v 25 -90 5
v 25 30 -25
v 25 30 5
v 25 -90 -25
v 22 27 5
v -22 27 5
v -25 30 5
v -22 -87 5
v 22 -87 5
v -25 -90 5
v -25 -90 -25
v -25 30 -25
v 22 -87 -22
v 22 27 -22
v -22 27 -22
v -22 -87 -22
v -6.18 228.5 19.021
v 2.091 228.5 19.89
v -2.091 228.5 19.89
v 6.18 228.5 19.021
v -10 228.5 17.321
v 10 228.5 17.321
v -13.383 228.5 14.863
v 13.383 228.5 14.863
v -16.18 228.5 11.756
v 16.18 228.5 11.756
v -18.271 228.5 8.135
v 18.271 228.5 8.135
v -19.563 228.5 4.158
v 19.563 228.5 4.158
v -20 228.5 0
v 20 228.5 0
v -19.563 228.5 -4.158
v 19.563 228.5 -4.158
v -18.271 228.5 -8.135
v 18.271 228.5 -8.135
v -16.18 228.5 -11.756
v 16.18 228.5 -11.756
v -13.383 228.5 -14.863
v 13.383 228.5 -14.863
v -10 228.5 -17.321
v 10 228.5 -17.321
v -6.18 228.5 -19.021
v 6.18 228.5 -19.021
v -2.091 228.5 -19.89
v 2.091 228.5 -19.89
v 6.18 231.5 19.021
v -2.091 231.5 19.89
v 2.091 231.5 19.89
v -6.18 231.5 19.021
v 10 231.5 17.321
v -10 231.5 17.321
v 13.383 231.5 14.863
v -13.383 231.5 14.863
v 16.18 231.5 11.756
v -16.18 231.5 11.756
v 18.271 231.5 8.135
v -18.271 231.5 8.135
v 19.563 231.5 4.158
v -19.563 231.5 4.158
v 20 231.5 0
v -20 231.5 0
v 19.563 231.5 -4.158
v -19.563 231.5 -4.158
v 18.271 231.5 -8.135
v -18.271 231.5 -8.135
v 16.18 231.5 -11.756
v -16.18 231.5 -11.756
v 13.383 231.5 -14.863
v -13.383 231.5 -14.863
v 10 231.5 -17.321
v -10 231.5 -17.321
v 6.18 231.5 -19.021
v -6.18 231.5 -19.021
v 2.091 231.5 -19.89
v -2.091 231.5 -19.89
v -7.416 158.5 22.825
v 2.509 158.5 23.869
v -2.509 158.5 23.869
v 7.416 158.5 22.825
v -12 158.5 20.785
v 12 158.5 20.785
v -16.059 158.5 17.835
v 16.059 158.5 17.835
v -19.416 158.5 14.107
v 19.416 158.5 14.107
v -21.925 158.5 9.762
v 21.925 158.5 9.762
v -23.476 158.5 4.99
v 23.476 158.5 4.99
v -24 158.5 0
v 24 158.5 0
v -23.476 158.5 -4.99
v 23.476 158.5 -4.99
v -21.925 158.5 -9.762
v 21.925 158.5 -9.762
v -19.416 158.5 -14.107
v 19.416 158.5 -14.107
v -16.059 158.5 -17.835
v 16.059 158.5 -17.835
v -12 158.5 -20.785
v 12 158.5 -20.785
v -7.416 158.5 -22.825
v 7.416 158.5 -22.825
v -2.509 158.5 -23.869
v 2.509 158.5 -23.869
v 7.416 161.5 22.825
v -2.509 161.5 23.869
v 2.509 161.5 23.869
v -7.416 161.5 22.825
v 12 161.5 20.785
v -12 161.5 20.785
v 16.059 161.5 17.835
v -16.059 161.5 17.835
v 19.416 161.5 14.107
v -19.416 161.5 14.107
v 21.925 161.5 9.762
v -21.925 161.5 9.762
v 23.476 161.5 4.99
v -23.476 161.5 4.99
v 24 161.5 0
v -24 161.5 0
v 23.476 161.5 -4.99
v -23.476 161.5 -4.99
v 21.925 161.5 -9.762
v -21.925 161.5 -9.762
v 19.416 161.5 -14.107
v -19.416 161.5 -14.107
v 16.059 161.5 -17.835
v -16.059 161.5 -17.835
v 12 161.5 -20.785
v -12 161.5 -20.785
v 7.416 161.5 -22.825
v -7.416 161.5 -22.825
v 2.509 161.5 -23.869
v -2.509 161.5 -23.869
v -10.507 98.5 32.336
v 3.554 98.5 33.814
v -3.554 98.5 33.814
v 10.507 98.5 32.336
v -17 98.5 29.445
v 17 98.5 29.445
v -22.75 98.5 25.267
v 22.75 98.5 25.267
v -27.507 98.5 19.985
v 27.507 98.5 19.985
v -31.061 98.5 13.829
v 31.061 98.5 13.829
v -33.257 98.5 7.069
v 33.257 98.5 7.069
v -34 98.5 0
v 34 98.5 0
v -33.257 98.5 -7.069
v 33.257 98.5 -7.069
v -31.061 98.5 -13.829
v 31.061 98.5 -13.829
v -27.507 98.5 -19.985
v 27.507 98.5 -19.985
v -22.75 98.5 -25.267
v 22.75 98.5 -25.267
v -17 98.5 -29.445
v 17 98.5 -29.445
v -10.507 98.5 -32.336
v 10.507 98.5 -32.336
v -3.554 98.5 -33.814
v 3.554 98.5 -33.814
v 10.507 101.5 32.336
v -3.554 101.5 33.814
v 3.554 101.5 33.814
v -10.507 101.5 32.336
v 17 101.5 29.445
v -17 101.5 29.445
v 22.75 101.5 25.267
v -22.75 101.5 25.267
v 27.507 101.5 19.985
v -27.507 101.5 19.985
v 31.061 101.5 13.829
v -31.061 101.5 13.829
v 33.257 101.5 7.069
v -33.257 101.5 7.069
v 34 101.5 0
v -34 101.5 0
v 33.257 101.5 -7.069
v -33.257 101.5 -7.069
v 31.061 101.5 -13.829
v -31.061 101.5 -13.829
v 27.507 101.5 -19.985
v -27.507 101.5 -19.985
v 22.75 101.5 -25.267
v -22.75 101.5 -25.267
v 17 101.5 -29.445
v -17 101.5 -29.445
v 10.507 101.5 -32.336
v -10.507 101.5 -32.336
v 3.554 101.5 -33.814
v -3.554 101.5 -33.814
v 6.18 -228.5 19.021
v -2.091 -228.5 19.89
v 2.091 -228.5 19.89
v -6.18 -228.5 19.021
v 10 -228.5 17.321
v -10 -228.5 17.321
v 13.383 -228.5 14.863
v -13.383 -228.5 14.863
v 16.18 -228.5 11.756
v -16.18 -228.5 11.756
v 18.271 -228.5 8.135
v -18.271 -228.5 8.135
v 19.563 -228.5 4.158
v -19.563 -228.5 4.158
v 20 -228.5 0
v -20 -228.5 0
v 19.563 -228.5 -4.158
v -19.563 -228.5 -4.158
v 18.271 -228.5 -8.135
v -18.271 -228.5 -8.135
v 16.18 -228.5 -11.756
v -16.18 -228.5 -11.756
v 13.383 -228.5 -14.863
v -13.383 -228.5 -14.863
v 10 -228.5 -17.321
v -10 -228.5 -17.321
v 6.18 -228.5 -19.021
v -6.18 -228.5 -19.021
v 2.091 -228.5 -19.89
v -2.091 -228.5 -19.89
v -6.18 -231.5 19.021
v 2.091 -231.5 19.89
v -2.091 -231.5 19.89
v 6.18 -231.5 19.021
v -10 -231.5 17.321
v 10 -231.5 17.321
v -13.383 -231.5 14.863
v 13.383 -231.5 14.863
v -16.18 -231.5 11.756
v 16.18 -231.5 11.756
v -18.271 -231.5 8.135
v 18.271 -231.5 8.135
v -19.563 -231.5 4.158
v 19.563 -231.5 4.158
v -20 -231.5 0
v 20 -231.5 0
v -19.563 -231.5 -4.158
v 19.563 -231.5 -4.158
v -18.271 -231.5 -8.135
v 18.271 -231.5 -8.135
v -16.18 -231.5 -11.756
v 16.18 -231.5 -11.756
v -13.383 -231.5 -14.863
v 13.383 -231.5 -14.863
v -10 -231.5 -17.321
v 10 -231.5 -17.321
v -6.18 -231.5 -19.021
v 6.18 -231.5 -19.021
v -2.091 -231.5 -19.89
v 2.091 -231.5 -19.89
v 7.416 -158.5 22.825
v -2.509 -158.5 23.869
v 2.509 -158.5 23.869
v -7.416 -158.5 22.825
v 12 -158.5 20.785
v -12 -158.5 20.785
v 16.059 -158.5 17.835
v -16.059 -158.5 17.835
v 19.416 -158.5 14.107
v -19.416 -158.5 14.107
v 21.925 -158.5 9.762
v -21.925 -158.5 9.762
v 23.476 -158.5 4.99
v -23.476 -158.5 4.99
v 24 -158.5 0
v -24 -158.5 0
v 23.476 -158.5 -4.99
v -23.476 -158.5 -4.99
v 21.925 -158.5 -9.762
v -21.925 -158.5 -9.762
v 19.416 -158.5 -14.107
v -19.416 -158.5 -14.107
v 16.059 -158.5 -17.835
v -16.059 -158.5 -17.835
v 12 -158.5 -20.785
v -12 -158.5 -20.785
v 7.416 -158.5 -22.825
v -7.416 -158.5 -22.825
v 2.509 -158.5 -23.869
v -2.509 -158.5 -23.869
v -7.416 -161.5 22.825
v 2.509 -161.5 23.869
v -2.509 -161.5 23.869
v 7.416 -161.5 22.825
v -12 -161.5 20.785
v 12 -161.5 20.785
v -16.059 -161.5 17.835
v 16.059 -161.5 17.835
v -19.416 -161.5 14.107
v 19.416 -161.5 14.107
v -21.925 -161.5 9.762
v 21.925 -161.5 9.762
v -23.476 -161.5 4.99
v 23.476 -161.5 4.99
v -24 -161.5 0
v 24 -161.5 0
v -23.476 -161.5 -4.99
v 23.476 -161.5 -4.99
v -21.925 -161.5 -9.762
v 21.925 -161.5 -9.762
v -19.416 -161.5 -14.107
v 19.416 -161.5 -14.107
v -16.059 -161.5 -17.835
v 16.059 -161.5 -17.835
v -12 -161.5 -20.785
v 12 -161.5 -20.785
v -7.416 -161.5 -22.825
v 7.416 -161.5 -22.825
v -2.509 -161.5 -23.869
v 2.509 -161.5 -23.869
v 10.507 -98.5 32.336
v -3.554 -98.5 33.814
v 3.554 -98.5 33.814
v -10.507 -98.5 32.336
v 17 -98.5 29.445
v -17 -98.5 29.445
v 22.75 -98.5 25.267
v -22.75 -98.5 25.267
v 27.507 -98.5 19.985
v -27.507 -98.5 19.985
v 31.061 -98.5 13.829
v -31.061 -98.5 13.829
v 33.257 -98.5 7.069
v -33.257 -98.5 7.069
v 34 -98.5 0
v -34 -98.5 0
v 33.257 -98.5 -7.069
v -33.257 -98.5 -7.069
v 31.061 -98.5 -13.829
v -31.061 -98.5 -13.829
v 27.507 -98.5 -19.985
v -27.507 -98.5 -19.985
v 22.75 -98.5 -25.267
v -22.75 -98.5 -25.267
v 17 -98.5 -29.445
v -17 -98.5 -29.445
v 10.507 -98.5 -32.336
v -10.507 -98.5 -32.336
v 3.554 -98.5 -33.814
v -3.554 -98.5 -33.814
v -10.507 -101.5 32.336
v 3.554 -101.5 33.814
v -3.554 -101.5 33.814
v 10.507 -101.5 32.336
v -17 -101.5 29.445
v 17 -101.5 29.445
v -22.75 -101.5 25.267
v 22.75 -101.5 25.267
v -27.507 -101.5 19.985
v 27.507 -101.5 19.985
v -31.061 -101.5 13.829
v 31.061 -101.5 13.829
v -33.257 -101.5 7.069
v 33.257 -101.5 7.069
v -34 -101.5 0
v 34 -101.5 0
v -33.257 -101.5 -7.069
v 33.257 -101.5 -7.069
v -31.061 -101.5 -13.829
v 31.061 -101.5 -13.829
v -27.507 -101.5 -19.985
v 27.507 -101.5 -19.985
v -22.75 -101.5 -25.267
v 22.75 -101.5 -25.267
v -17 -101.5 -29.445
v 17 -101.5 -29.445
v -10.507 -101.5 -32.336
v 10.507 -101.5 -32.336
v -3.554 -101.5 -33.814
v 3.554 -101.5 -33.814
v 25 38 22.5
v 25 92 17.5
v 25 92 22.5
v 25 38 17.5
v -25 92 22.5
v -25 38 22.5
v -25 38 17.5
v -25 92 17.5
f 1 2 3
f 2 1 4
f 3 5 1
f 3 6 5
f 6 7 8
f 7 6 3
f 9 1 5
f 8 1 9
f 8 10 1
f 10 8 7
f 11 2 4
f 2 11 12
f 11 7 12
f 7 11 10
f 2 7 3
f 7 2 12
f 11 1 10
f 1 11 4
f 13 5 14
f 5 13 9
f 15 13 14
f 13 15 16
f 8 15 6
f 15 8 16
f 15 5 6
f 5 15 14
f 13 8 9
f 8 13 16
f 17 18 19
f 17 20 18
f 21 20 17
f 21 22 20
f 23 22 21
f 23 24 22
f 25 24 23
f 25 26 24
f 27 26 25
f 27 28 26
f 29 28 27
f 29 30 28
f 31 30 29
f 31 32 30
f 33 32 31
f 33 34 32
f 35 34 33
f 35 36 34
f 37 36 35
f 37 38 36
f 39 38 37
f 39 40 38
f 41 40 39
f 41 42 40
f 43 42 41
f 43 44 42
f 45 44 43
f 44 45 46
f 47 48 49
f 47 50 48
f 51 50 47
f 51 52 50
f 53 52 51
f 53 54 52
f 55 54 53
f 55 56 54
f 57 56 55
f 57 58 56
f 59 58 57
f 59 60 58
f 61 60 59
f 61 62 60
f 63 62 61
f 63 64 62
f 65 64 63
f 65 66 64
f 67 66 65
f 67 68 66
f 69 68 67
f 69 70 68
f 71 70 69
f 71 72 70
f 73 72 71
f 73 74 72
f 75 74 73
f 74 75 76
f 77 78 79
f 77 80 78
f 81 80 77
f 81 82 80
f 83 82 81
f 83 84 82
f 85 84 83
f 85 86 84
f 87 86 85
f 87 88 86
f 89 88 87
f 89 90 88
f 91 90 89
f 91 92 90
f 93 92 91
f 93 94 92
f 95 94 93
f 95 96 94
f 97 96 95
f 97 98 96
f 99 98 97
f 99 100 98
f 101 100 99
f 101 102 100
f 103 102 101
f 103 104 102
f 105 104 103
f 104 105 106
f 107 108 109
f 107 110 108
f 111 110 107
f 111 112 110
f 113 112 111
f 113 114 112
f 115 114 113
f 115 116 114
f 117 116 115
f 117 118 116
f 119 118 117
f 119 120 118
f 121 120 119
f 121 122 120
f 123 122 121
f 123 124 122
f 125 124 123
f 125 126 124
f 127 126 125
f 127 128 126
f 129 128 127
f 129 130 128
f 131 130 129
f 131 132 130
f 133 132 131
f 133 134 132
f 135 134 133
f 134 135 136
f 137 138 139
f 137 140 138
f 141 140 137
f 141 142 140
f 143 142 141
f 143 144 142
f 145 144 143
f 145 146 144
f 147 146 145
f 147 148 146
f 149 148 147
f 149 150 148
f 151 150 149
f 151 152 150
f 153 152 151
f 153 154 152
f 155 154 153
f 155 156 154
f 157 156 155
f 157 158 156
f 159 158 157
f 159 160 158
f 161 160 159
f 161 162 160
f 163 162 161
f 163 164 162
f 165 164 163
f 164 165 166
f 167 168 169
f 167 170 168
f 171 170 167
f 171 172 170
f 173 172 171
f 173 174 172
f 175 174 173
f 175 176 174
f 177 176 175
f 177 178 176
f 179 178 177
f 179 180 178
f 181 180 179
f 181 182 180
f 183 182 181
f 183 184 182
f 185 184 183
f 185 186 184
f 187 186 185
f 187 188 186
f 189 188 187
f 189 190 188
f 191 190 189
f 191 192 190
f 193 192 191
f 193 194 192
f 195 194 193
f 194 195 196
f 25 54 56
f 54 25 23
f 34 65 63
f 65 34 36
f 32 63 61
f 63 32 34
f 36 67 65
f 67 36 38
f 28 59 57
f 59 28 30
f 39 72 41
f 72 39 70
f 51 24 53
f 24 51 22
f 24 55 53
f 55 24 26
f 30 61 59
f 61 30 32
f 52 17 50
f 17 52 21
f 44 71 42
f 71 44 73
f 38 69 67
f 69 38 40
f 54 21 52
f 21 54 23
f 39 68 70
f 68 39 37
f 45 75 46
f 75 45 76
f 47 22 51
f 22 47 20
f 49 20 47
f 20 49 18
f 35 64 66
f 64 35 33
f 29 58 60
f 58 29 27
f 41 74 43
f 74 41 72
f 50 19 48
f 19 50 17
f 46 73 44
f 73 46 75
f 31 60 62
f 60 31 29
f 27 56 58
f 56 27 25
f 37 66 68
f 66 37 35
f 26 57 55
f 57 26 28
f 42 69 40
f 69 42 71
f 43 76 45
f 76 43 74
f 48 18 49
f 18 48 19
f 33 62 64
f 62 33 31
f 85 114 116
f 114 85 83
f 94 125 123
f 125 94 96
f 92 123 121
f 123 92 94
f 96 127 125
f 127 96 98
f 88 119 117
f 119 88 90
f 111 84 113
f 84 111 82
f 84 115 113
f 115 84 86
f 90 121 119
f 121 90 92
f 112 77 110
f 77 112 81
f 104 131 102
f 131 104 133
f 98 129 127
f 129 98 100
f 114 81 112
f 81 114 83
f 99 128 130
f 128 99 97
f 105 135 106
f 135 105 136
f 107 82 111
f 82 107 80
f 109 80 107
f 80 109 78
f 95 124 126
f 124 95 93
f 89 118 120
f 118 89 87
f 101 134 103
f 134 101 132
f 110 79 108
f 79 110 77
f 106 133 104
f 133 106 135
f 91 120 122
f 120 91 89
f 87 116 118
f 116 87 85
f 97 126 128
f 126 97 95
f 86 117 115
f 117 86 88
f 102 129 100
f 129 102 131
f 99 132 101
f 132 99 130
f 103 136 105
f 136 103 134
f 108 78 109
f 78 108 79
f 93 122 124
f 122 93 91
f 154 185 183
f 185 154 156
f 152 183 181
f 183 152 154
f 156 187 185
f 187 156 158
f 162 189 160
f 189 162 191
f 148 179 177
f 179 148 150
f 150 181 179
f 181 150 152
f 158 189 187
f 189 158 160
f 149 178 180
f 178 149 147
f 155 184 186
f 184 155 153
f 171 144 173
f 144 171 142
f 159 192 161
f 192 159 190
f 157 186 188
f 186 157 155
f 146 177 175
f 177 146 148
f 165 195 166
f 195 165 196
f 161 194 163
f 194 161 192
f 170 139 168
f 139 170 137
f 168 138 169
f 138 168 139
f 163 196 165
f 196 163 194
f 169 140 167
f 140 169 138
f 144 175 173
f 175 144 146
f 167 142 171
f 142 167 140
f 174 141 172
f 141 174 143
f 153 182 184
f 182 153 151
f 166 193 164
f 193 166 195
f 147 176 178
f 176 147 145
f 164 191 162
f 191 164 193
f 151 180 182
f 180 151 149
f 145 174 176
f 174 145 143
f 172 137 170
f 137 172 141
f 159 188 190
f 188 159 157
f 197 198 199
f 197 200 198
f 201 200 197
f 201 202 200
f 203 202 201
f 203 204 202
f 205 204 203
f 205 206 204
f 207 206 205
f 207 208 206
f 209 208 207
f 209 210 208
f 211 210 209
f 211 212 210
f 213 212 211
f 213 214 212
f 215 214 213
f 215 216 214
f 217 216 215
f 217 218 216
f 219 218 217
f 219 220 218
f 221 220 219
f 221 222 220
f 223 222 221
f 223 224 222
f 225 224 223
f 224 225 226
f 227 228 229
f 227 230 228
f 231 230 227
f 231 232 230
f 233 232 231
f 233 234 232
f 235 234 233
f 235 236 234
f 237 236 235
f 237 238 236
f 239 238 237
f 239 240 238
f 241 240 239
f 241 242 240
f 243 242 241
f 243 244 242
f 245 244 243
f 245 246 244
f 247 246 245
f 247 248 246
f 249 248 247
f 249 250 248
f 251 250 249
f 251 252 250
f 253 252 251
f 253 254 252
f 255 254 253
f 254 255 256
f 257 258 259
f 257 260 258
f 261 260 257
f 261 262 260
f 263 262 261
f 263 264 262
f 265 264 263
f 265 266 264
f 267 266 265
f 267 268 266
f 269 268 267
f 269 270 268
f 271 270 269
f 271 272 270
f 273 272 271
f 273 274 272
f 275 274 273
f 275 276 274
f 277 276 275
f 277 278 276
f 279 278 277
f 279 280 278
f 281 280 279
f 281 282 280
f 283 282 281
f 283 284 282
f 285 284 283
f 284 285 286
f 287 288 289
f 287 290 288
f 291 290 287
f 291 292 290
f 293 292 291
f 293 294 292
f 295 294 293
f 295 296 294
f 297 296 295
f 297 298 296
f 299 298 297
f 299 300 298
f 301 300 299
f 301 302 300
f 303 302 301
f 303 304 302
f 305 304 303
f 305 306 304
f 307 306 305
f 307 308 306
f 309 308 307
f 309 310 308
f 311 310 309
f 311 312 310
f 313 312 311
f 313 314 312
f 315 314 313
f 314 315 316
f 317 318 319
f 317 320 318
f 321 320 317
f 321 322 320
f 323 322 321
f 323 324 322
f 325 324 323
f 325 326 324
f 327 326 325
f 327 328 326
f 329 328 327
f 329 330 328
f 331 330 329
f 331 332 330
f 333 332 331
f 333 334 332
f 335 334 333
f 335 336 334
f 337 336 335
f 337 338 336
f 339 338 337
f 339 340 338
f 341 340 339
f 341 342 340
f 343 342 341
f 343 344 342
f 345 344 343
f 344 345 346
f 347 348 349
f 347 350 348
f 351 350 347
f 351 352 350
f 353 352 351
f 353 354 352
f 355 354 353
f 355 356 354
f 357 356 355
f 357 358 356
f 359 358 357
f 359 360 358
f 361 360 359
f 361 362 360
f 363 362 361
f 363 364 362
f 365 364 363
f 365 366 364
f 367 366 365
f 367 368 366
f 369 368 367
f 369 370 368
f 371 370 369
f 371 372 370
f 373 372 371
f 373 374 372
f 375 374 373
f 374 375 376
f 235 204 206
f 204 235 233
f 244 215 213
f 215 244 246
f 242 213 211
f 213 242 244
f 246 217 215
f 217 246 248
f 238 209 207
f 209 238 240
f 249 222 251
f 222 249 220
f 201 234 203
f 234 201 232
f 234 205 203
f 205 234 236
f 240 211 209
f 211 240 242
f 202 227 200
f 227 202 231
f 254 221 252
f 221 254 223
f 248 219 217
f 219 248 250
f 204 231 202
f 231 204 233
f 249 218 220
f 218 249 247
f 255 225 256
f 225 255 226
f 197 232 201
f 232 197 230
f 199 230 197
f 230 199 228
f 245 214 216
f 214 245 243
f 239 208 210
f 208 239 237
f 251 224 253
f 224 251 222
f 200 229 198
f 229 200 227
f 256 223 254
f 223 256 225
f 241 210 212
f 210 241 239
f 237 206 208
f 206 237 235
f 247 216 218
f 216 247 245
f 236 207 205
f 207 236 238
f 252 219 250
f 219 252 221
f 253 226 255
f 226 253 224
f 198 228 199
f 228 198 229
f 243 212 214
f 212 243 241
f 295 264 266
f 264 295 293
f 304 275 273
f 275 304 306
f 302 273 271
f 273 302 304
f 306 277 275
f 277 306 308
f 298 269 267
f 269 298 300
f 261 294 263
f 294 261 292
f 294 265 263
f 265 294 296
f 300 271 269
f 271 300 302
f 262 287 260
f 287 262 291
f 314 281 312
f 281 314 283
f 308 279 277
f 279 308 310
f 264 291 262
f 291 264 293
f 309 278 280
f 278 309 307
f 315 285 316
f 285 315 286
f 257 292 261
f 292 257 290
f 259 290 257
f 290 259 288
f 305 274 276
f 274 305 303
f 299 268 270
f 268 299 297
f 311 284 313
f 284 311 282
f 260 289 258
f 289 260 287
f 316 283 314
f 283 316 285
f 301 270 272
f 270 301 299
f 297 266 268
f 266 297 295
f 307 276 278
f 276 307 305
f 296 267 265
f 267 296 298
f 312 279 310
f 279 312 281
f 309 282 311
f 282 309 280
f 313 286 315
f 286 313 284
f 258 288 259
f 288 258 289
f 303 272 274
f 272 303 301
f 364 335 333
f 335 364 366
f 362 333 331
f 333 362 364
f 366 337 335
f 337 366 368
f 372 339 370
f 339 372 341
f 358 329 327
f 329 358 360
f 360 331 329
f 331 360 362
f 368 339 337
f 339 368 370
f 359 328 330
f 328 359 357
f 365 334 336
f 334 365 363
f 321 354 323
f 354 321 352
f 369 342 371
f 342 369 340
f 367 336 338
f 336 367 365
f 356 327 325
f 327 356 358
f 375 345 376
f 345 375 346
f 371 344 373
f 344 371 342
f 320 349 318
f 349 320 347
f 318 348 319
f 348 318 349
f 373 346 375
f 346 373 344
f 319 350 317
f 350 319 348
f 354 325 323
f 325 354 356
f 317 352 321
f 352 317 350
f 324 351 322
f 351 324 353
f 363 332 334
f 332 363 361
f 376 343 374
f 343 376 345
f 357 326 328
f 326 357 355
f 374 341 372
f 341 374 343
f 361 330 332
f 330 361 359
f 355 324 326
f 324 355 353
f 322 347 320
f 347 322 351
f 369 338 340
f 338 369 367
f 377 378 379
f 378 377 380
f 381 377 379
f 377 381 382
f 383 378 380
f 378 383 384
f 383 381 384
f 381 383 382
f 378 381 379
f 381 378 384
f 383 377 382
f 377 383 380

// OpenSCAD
a=0; // decalage d'angle.
ep=3; // epaisseur du bois
nb=12; // nb de pales
h=480; // hauteur totale
kerf=0.1; // kerf du laser
logo_ep=5; // epaisseur de la plaque logo

profile_file="../step1/out/torche_contour.dxf";
logo_file="../step1/out/Logo_JO_d'été_-_Paris_2024.dxf";

// bagues: [numéro, hauteur, diamètre int, diamètre ext]
bagues_spec=[
    [0,h/2-10,16,20],
    [1,160,16,24],
    [2,100,26,34]
];

module pales(ep){

    translate([0,-h/2,0]){
        for (i=[0:nb]){
            rotate([0,a+i*(360/nb),0]) translate([9,0,0]) linear_extrude(height = ep, center = true) import(file = profile_file);
        }
    }

}

module pales_cutter(ep){
    difference(){
        children();
        pales(ep-kerf);    
    }
}

module bague(r,ep){
   rotate([-90,0,0]) cylinder(h=ep,r=r,center=true);
}

module mirrorer(v){
    children();
    mirror(v) children();
}


module bagues(ep,seulementInterieur){
    mirrorer([0,1,0]){
        for (s=bagues_spec){
            translate([0,s[1],0]) bague(s[2],ep);
        }
    if (seulementInterieur==false){
        for (s=bagues_spec){
            translate([0,s[1],0]) bague(s[3],ep);
        }
        }
    }
}

module bagues_cutter(ep){
    difference(){
        children();
        bagues(ep-kerf,seulementInterieur=true);    
    }
}


module trouBoite(){
    difference(){
        children();
        for (i=[0:4]){
            translate([0,0,i*10]) hull() boite();
        }
    }
}
module trouLogo(){
    difference(){
        children();
        union(){
        for (i=[1:10]){
            translate([0,0,i*(logo_ep-1)]) logo_plaque();
        }
        translate([0,30,50]) rotate([90,0,0]) cube([50,50,20],center=true);
        }
    }
}


module boite(){
    translate([0,-30,-10])
    difference(){
        cube([50,120,30],center=true);    
            translate([0,0,3]) cube([50-6,120-6,30],center=true);    
    }
}

module logo_plaque(){
    translate([0,65,20]) {
        color("white") cube([50,54,logo_ep],center=true);
        color("red") translate([-23,-27,3]) linear_extrude(1) import(logo_file);
    }

}


module torche(ep){
    bagues_cutter(ep){
        pales(ep);
    }
}

module torche_cutter(ep){
    difference(){
        children();
        bagues_cutter(ep+kerf){ pales(ep-kerf);}
    }
}

module torche2(){
    trouLogo() trouBoite() torche(ep);
}

// ce module permet d'applatir les coupes en angle afin de récupérer uniquement la plus petite dimension.
module flatteninter(){
    children();
//    intersection(){
//        translate([0,0,ep/2-0.2]) children();
//        translate([0,0,-ep/2+0.2]) children();
//    }
}

module torche2D(){     
    for (i=[0:nb/2-1]){
        //for (i=[0:1]){
         projection(true) translate([(i+1)*120,0,0]) flatteninter() rotate([0,i*(360/nb)-a,0]) torche2();
        }
}


module bagues2D(){
    mirror([1,0,0]){
    for (s=bagues_spec){
        translate([s[0]*70,0,0]){
         projection(true) color("green") rotate([90,0,0]) translate([0,-s[1],0]) torche_cutter(ep) bagues(ep,seulementInterieur=false);
        }
    }
}
}

module plan2D(){
    torche2D();       
    bagues2D();
}

module plan3D(){
    torche2();
    color("green") bagues(ep,seulementInterieur=false);
    color("blue") boite();
    logo_plaque();
}


// vue 3D
plan3D();

// vue 2D bagues + pales
//plan2D();

// video
//rotate([0,$t*360,0]) plan3D();
